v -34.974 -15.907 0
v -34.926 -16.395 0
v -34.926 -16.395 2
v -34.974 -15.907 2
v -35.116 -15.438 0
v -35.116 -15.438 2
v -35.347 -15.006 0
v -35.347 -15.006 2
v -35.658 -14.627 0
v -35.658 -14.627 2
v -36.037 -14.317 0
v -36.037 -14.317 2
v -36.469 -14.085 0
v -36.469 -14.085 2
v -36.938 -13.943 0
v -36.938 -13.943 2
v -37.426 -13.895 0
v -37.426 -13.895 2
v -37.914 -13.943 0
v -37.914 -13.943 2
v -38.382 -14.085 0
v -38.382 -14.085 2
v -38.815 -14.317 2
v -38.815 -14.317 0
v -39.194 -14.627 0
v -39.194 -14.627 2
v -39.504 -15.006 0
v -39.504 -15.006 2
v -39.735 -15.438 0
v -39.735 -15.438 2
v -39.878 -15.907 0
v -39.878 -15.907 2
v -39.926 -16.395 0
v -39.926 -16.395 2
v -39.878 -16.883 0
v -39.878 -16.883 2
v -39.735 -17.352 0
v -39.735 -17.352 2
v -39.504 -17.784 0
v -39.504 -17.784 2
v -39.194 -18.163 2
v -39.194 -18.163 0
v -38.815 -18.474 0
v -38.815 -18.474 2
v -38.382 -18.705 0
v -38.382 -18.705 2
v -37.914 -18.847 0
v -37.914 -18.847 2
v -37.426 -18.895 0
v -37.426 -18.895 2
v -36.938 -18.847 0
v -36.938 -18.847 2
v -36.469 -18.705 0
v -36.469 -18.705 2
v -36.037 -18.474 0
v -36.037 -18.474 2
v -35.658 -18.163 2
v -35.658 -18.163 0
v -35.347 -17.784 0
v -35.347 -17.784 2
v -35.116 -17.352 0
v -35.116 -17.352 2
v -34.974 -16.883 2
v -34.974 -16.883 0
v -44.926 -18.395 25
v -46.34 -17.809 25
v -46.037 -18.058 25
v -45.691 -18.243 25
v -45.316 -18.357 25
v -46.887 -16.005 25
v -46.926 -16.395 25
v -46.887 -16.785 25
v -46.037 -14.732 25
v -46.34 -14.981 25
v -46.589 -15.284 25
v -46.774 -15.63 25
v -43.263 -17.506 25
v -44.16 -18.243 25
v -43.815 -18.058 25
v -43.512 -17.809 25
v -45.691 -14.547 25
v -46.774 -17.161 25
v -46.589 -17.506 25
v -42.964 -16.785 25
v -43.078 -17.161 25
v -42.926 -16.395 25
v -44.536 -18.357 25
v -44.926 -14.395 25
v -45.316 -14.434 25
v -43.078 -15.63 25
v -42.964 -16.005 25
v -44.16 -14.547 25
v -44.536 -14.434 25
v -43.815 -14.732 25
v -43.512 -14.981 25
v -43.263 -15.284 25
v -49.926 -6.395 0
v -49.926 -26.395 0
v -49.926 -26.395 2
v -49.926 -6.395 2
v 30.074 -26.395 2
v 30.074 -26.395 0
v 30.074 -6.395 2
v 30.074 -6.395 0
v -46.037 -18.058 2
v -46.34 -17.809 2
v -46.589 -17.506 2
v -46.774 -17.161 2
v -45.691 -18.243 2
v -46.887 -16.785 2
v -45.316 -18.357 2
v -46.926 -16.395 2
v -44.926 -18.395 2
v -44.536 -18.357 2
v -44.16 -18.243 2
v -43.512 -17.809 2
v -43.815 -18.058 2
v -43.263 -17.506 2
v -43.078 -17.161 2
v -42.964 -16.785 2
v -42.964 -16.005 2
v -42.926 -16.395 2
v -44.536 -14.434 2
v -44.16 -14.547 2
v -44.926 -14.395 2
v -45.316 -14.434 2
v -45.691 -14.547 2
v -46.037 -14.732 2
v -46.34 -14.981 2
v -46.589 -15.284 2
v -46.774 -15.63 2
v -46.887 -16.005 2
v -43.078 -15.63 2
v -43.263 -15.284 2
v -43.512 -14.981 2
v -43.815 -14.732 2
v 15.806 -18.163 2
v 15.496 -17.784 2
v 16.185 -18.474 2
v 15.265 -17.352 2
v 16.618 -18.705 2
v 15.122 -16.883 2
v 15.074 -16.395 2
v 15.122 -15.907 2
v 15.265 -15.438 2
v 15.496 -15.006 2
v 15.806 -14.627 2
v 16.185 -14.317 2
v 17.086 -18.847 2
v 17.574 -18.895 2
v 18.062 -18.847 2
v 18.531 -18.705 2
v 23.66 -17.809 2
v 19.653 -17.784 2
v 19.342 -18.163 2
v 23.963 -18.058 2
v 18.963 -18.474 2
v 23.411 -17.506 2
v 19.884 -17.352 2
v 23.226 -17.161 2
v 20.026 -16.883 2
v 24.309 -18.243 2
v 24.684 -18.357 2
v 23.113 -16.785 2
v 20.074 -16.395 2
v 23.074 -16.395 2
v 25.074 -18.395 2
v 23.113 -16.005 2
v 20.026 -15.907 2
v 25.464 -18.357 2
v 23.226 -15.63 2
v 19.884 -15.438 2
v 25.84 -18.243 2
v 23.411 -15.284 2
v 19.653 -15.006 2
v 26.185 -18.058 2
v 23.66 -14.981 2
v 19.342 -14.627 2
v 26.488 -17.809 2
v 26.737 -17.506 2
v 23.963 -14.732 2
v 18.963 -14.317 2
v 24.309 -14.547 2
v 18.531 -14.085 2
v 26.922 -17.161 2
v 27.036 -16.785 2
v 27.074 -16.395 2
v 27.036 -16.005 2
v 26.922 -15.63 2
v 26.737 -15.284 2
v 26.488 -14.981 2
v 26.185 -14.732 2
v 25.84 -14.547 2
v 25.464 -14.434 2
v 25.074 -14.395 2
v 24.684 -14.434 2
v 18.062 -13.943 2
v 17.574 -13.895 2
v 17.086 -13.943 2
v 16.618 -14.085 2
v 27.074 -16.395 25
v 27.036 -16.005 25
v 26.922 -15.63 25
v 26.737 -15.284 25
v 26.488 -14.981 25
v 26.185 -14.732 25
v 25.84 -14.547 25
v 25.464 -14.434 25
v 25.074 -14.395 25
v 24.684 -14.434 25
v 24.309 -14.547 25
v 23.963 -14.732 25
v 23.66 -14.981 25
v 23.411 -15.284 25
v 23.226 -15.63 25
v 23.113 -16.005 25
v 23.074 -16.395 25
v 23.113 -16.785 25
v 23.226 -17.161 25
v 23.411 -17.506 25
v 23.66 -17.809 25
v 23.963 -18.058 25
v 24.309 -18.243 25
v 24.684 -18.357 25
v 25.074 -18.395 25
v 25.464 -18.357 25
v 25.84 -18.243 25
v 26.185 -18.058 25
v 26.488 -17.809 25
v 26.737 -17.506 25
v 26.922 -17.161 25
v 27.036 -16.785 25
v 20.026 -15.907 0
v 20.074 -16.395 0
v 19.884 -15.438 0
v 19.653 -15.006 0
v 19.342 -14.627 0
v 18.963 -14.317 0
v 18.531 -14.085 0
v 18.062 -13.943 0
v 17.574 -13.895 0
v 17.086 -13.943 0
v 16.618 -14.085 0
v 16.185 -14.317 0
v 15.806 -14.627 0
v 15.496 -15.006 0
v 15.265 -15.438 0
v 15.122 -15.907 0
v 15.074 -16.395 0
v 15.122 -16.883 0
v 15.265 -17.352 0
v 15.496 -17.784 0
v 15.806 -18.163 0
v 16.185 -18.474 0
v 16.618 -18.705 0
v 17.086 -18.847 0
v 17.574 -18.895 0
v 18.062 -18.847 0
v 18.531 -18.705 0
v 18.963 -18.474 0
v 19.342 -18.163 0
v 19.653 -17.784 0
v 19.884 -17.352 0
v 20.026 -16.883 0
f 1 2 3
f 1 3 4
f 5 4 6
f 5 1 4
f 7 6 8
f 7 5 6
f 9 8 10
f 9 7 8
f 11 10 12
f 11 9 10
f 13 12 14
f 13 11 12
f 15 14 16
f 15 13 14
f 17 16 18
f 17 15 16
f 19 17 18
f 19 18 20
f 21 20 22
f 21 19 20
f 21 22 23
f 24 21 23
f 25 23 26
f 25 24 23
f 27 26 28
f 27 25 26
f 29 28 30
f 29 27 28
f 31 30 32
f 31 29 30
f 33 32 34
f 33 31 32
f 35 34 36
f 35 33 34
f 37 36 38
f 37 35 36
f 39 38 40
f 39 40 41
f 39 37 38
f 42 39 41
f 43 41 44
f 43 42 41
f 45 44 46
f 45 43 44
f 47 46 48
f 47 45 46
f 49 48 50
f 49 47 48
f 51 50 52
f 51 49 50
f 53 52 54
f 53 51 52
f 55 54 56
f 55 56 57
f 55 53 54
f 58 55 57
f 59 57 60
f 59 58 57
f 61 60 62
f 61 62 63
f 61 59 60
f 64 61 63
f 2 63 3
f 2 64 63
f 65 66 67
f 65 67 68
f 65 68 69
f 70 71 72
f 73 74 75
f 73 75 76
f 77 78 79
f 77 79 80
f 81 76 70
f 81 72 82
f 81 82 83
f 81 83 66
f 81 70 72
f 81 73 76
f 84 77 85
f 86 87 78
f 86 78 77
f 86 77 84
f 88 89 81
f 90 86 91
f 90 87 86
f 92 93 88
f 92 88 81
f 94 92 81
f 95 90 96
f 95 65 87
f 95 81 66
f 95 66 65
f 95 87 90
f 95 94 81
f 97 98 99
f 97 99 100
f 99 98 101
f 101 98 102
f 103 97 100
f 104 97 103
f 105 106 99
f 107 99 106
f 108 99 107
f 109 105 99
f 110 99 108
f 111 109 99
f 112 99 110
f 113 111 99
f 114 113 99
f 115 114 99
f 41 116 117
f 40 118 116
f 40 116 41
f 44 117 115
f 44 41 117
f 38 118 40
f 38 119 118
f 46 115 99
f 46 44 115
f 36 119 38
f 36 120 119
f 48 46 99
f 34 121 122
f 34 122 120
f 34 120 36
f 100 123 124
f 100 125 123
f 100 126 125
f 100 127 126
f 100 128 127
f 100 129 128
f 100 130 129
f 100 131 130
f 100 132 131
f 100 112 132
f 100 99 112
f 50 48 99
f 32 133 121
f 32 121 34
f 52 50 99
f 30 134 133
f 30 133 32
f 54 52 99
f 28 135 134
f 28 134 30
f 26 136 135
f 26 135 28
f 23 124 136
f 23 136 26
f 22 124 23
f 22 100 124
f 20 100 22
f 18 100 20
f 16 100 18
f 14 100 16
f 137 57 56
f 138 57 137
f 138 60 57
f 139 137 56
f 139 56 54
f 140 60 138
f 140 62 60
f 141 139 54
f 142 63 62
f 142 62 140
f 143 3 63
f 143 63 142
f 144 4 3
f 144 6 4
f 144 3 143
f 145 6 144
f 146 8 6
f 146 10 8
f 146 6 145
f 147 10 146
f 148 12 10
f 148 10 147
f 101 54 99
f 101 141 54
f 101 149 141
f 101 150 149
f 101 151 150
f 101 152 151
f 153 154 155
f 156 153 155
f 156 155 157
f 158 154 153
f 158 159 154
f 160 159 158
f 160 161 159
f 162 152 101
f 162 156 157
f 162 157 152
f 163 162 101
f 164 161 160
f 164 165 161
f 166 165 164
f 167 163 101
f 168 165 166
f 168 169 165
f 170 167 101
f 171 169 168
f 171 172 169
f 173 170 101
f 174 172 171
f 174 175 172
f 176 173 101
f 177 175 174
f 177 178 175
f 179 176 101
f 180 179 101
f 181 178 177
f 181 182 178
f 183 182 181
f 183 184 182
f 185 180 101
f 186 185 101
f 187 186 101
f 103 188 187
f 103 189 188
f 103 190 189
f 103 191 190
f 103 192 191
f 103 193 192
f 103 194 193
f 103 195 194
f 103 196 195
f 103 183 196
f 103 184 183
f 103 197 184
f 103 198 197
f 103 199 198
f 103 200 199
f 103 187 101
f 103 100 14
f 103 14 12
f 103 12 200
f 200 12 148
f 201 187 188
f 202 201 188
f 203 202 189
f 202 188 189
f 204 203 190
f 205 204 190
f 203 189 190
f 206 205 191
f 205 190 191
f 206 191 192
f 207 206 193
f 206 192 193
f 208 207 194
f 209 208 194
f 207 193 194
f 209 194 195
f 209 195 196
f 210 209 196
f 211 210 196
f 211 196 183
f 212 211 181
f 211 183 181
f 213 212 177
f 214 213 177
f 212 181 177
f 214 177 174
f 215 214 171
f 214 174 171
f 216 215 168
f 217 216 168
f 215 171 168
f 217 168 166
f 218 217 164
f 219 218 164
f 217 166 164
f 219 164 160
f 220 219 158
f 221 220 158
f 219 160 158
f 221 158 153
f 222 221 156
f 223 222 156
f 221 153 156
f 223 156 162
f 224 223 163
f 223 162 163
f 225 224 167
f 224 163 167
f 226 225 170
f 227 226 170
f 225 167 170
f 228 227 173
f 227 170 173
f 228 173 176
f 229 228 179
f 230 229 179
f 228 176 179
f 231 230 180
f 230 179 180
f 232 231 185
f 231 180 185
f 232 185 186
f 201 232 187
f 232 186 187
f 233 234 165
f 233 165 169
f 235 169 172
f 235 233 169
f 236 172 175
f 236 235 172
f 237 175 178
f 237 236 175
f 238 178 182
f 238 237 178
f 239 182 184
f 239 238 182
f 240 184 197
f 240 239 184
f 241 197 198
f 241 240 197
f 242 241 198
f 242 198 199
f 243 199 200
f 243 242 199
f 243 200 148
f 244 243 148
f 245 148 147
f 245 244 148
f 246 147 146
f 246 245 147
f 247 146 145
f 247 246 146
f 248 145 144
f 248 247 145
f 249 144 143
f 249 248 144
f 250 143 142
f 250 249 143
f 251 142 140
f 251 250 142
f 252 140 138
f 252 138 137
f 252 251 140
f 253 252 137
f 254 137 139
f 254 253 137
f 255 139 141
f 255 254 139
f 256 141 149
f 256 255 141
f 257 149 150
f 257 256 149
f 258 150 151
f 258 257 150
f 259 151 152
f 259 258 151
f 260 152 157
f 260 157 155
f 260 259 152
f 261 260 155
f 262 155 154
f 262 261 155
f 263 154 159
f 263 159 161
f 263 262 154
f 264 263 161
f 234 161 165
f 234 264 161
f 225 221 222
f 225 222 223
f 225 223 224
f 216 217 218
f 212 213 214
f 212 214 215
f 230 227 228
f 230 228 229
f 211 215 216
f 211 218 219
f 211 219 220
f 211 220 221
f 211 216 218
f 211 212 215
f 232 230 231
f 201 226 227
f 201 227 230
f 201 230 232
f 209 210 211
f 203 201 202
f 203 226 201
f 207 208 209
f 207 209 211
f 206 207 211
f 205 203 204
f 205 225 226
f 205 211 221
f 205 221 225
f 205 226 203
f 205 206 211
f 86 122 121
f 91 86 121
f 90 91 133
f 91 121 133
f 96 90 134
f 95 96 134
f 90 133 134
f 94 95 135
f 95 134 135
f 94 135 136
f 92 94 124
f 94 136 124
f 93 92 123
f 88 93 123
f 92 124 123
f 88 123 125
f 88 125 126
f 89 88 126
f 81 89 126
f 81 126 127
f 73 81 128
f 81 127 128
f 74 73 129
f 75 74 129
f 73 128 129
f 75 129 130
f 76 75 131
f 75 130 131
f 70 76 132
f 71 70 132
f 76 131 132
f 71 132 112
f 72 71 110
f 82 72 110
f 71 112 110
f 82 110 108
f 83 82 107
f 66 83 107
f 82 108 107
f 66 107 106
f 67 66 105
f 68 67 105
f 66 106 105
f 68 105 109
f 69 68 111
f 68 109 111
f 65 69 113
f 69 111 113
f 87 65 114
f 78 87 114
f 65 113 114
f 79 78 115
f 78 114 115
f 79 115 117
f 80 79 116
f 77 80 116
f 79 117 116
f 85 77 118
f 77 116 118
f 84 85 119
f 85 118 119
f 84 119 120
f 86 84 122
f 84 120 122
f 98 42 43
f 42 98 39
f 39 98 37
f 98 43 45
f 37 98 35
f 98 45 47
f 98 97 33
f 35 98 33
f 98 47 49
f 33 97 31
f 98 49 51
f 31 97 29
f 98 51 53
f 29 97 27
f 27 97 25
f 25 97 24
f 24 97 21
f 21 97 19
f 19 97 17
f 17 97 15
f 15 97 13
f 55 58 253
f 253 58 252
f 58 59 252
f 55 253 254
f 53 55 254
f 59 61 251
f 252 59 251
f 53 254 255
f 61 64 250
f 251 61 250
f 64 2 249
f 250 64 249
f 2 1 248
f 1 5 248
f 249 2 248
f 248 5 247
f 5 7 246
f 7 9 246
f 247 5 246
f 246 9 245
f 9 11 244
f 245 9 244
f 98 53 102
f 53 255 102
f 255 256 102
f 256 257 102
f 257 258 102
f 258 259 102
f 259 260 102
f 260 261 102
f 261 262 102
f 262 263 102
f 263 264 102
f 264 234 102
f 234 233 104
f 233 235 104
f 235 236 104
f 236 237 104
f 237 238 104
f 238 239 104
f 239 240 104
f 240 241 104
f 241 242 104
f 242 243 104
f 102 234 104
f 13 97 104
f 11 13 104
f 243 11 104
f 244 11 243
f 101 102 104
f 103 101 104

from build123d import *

# Parameters (mm, degrees)
SKETCH1_W           = 80
SKETCH1_H           = 20
SKETCH1_R           = 2.5
BOSS_EXTRUDE1_DEPTH = 2
SKETCH2_R           = 2
BOSS_EXTRUDE2_DEPTH = 23


with BuildPart() as part:
    # Sketch1 → Boss-Extrude1 (new body)
    with BuildSketch(Plane.XY):
        with Locations((-9.925787146, -16.395190745)):
            Rectangle(SKETCH1_W, SKETCH1_H)
        with Locations((-37.425787146, -16.395190745)):
            Circle(SKETCH1_R, mode=Mode.SUBTRACT)
        with Locations((17.574212854, -16.395190745)):
            Circle(SKETCH1_R, mode=Mode.SUBTRACT)
    extrude(amount=BOSS_EXTRUDE1_DEPTH)

    # Sketch2 → Boss-Extrude2 (add)
    with BuildSketch(Plane.XY.offset(2)):
        with Locations((25.074212854, -16.395190745)):
            Circle(SKETCH2_R)
        with Locations((-44.925787146, -16.395190745)):
            Circle(SKETCH2_R)
    extrude(amount=BOSS_EXTRUDE2_DEPTH)


solid = part.part
